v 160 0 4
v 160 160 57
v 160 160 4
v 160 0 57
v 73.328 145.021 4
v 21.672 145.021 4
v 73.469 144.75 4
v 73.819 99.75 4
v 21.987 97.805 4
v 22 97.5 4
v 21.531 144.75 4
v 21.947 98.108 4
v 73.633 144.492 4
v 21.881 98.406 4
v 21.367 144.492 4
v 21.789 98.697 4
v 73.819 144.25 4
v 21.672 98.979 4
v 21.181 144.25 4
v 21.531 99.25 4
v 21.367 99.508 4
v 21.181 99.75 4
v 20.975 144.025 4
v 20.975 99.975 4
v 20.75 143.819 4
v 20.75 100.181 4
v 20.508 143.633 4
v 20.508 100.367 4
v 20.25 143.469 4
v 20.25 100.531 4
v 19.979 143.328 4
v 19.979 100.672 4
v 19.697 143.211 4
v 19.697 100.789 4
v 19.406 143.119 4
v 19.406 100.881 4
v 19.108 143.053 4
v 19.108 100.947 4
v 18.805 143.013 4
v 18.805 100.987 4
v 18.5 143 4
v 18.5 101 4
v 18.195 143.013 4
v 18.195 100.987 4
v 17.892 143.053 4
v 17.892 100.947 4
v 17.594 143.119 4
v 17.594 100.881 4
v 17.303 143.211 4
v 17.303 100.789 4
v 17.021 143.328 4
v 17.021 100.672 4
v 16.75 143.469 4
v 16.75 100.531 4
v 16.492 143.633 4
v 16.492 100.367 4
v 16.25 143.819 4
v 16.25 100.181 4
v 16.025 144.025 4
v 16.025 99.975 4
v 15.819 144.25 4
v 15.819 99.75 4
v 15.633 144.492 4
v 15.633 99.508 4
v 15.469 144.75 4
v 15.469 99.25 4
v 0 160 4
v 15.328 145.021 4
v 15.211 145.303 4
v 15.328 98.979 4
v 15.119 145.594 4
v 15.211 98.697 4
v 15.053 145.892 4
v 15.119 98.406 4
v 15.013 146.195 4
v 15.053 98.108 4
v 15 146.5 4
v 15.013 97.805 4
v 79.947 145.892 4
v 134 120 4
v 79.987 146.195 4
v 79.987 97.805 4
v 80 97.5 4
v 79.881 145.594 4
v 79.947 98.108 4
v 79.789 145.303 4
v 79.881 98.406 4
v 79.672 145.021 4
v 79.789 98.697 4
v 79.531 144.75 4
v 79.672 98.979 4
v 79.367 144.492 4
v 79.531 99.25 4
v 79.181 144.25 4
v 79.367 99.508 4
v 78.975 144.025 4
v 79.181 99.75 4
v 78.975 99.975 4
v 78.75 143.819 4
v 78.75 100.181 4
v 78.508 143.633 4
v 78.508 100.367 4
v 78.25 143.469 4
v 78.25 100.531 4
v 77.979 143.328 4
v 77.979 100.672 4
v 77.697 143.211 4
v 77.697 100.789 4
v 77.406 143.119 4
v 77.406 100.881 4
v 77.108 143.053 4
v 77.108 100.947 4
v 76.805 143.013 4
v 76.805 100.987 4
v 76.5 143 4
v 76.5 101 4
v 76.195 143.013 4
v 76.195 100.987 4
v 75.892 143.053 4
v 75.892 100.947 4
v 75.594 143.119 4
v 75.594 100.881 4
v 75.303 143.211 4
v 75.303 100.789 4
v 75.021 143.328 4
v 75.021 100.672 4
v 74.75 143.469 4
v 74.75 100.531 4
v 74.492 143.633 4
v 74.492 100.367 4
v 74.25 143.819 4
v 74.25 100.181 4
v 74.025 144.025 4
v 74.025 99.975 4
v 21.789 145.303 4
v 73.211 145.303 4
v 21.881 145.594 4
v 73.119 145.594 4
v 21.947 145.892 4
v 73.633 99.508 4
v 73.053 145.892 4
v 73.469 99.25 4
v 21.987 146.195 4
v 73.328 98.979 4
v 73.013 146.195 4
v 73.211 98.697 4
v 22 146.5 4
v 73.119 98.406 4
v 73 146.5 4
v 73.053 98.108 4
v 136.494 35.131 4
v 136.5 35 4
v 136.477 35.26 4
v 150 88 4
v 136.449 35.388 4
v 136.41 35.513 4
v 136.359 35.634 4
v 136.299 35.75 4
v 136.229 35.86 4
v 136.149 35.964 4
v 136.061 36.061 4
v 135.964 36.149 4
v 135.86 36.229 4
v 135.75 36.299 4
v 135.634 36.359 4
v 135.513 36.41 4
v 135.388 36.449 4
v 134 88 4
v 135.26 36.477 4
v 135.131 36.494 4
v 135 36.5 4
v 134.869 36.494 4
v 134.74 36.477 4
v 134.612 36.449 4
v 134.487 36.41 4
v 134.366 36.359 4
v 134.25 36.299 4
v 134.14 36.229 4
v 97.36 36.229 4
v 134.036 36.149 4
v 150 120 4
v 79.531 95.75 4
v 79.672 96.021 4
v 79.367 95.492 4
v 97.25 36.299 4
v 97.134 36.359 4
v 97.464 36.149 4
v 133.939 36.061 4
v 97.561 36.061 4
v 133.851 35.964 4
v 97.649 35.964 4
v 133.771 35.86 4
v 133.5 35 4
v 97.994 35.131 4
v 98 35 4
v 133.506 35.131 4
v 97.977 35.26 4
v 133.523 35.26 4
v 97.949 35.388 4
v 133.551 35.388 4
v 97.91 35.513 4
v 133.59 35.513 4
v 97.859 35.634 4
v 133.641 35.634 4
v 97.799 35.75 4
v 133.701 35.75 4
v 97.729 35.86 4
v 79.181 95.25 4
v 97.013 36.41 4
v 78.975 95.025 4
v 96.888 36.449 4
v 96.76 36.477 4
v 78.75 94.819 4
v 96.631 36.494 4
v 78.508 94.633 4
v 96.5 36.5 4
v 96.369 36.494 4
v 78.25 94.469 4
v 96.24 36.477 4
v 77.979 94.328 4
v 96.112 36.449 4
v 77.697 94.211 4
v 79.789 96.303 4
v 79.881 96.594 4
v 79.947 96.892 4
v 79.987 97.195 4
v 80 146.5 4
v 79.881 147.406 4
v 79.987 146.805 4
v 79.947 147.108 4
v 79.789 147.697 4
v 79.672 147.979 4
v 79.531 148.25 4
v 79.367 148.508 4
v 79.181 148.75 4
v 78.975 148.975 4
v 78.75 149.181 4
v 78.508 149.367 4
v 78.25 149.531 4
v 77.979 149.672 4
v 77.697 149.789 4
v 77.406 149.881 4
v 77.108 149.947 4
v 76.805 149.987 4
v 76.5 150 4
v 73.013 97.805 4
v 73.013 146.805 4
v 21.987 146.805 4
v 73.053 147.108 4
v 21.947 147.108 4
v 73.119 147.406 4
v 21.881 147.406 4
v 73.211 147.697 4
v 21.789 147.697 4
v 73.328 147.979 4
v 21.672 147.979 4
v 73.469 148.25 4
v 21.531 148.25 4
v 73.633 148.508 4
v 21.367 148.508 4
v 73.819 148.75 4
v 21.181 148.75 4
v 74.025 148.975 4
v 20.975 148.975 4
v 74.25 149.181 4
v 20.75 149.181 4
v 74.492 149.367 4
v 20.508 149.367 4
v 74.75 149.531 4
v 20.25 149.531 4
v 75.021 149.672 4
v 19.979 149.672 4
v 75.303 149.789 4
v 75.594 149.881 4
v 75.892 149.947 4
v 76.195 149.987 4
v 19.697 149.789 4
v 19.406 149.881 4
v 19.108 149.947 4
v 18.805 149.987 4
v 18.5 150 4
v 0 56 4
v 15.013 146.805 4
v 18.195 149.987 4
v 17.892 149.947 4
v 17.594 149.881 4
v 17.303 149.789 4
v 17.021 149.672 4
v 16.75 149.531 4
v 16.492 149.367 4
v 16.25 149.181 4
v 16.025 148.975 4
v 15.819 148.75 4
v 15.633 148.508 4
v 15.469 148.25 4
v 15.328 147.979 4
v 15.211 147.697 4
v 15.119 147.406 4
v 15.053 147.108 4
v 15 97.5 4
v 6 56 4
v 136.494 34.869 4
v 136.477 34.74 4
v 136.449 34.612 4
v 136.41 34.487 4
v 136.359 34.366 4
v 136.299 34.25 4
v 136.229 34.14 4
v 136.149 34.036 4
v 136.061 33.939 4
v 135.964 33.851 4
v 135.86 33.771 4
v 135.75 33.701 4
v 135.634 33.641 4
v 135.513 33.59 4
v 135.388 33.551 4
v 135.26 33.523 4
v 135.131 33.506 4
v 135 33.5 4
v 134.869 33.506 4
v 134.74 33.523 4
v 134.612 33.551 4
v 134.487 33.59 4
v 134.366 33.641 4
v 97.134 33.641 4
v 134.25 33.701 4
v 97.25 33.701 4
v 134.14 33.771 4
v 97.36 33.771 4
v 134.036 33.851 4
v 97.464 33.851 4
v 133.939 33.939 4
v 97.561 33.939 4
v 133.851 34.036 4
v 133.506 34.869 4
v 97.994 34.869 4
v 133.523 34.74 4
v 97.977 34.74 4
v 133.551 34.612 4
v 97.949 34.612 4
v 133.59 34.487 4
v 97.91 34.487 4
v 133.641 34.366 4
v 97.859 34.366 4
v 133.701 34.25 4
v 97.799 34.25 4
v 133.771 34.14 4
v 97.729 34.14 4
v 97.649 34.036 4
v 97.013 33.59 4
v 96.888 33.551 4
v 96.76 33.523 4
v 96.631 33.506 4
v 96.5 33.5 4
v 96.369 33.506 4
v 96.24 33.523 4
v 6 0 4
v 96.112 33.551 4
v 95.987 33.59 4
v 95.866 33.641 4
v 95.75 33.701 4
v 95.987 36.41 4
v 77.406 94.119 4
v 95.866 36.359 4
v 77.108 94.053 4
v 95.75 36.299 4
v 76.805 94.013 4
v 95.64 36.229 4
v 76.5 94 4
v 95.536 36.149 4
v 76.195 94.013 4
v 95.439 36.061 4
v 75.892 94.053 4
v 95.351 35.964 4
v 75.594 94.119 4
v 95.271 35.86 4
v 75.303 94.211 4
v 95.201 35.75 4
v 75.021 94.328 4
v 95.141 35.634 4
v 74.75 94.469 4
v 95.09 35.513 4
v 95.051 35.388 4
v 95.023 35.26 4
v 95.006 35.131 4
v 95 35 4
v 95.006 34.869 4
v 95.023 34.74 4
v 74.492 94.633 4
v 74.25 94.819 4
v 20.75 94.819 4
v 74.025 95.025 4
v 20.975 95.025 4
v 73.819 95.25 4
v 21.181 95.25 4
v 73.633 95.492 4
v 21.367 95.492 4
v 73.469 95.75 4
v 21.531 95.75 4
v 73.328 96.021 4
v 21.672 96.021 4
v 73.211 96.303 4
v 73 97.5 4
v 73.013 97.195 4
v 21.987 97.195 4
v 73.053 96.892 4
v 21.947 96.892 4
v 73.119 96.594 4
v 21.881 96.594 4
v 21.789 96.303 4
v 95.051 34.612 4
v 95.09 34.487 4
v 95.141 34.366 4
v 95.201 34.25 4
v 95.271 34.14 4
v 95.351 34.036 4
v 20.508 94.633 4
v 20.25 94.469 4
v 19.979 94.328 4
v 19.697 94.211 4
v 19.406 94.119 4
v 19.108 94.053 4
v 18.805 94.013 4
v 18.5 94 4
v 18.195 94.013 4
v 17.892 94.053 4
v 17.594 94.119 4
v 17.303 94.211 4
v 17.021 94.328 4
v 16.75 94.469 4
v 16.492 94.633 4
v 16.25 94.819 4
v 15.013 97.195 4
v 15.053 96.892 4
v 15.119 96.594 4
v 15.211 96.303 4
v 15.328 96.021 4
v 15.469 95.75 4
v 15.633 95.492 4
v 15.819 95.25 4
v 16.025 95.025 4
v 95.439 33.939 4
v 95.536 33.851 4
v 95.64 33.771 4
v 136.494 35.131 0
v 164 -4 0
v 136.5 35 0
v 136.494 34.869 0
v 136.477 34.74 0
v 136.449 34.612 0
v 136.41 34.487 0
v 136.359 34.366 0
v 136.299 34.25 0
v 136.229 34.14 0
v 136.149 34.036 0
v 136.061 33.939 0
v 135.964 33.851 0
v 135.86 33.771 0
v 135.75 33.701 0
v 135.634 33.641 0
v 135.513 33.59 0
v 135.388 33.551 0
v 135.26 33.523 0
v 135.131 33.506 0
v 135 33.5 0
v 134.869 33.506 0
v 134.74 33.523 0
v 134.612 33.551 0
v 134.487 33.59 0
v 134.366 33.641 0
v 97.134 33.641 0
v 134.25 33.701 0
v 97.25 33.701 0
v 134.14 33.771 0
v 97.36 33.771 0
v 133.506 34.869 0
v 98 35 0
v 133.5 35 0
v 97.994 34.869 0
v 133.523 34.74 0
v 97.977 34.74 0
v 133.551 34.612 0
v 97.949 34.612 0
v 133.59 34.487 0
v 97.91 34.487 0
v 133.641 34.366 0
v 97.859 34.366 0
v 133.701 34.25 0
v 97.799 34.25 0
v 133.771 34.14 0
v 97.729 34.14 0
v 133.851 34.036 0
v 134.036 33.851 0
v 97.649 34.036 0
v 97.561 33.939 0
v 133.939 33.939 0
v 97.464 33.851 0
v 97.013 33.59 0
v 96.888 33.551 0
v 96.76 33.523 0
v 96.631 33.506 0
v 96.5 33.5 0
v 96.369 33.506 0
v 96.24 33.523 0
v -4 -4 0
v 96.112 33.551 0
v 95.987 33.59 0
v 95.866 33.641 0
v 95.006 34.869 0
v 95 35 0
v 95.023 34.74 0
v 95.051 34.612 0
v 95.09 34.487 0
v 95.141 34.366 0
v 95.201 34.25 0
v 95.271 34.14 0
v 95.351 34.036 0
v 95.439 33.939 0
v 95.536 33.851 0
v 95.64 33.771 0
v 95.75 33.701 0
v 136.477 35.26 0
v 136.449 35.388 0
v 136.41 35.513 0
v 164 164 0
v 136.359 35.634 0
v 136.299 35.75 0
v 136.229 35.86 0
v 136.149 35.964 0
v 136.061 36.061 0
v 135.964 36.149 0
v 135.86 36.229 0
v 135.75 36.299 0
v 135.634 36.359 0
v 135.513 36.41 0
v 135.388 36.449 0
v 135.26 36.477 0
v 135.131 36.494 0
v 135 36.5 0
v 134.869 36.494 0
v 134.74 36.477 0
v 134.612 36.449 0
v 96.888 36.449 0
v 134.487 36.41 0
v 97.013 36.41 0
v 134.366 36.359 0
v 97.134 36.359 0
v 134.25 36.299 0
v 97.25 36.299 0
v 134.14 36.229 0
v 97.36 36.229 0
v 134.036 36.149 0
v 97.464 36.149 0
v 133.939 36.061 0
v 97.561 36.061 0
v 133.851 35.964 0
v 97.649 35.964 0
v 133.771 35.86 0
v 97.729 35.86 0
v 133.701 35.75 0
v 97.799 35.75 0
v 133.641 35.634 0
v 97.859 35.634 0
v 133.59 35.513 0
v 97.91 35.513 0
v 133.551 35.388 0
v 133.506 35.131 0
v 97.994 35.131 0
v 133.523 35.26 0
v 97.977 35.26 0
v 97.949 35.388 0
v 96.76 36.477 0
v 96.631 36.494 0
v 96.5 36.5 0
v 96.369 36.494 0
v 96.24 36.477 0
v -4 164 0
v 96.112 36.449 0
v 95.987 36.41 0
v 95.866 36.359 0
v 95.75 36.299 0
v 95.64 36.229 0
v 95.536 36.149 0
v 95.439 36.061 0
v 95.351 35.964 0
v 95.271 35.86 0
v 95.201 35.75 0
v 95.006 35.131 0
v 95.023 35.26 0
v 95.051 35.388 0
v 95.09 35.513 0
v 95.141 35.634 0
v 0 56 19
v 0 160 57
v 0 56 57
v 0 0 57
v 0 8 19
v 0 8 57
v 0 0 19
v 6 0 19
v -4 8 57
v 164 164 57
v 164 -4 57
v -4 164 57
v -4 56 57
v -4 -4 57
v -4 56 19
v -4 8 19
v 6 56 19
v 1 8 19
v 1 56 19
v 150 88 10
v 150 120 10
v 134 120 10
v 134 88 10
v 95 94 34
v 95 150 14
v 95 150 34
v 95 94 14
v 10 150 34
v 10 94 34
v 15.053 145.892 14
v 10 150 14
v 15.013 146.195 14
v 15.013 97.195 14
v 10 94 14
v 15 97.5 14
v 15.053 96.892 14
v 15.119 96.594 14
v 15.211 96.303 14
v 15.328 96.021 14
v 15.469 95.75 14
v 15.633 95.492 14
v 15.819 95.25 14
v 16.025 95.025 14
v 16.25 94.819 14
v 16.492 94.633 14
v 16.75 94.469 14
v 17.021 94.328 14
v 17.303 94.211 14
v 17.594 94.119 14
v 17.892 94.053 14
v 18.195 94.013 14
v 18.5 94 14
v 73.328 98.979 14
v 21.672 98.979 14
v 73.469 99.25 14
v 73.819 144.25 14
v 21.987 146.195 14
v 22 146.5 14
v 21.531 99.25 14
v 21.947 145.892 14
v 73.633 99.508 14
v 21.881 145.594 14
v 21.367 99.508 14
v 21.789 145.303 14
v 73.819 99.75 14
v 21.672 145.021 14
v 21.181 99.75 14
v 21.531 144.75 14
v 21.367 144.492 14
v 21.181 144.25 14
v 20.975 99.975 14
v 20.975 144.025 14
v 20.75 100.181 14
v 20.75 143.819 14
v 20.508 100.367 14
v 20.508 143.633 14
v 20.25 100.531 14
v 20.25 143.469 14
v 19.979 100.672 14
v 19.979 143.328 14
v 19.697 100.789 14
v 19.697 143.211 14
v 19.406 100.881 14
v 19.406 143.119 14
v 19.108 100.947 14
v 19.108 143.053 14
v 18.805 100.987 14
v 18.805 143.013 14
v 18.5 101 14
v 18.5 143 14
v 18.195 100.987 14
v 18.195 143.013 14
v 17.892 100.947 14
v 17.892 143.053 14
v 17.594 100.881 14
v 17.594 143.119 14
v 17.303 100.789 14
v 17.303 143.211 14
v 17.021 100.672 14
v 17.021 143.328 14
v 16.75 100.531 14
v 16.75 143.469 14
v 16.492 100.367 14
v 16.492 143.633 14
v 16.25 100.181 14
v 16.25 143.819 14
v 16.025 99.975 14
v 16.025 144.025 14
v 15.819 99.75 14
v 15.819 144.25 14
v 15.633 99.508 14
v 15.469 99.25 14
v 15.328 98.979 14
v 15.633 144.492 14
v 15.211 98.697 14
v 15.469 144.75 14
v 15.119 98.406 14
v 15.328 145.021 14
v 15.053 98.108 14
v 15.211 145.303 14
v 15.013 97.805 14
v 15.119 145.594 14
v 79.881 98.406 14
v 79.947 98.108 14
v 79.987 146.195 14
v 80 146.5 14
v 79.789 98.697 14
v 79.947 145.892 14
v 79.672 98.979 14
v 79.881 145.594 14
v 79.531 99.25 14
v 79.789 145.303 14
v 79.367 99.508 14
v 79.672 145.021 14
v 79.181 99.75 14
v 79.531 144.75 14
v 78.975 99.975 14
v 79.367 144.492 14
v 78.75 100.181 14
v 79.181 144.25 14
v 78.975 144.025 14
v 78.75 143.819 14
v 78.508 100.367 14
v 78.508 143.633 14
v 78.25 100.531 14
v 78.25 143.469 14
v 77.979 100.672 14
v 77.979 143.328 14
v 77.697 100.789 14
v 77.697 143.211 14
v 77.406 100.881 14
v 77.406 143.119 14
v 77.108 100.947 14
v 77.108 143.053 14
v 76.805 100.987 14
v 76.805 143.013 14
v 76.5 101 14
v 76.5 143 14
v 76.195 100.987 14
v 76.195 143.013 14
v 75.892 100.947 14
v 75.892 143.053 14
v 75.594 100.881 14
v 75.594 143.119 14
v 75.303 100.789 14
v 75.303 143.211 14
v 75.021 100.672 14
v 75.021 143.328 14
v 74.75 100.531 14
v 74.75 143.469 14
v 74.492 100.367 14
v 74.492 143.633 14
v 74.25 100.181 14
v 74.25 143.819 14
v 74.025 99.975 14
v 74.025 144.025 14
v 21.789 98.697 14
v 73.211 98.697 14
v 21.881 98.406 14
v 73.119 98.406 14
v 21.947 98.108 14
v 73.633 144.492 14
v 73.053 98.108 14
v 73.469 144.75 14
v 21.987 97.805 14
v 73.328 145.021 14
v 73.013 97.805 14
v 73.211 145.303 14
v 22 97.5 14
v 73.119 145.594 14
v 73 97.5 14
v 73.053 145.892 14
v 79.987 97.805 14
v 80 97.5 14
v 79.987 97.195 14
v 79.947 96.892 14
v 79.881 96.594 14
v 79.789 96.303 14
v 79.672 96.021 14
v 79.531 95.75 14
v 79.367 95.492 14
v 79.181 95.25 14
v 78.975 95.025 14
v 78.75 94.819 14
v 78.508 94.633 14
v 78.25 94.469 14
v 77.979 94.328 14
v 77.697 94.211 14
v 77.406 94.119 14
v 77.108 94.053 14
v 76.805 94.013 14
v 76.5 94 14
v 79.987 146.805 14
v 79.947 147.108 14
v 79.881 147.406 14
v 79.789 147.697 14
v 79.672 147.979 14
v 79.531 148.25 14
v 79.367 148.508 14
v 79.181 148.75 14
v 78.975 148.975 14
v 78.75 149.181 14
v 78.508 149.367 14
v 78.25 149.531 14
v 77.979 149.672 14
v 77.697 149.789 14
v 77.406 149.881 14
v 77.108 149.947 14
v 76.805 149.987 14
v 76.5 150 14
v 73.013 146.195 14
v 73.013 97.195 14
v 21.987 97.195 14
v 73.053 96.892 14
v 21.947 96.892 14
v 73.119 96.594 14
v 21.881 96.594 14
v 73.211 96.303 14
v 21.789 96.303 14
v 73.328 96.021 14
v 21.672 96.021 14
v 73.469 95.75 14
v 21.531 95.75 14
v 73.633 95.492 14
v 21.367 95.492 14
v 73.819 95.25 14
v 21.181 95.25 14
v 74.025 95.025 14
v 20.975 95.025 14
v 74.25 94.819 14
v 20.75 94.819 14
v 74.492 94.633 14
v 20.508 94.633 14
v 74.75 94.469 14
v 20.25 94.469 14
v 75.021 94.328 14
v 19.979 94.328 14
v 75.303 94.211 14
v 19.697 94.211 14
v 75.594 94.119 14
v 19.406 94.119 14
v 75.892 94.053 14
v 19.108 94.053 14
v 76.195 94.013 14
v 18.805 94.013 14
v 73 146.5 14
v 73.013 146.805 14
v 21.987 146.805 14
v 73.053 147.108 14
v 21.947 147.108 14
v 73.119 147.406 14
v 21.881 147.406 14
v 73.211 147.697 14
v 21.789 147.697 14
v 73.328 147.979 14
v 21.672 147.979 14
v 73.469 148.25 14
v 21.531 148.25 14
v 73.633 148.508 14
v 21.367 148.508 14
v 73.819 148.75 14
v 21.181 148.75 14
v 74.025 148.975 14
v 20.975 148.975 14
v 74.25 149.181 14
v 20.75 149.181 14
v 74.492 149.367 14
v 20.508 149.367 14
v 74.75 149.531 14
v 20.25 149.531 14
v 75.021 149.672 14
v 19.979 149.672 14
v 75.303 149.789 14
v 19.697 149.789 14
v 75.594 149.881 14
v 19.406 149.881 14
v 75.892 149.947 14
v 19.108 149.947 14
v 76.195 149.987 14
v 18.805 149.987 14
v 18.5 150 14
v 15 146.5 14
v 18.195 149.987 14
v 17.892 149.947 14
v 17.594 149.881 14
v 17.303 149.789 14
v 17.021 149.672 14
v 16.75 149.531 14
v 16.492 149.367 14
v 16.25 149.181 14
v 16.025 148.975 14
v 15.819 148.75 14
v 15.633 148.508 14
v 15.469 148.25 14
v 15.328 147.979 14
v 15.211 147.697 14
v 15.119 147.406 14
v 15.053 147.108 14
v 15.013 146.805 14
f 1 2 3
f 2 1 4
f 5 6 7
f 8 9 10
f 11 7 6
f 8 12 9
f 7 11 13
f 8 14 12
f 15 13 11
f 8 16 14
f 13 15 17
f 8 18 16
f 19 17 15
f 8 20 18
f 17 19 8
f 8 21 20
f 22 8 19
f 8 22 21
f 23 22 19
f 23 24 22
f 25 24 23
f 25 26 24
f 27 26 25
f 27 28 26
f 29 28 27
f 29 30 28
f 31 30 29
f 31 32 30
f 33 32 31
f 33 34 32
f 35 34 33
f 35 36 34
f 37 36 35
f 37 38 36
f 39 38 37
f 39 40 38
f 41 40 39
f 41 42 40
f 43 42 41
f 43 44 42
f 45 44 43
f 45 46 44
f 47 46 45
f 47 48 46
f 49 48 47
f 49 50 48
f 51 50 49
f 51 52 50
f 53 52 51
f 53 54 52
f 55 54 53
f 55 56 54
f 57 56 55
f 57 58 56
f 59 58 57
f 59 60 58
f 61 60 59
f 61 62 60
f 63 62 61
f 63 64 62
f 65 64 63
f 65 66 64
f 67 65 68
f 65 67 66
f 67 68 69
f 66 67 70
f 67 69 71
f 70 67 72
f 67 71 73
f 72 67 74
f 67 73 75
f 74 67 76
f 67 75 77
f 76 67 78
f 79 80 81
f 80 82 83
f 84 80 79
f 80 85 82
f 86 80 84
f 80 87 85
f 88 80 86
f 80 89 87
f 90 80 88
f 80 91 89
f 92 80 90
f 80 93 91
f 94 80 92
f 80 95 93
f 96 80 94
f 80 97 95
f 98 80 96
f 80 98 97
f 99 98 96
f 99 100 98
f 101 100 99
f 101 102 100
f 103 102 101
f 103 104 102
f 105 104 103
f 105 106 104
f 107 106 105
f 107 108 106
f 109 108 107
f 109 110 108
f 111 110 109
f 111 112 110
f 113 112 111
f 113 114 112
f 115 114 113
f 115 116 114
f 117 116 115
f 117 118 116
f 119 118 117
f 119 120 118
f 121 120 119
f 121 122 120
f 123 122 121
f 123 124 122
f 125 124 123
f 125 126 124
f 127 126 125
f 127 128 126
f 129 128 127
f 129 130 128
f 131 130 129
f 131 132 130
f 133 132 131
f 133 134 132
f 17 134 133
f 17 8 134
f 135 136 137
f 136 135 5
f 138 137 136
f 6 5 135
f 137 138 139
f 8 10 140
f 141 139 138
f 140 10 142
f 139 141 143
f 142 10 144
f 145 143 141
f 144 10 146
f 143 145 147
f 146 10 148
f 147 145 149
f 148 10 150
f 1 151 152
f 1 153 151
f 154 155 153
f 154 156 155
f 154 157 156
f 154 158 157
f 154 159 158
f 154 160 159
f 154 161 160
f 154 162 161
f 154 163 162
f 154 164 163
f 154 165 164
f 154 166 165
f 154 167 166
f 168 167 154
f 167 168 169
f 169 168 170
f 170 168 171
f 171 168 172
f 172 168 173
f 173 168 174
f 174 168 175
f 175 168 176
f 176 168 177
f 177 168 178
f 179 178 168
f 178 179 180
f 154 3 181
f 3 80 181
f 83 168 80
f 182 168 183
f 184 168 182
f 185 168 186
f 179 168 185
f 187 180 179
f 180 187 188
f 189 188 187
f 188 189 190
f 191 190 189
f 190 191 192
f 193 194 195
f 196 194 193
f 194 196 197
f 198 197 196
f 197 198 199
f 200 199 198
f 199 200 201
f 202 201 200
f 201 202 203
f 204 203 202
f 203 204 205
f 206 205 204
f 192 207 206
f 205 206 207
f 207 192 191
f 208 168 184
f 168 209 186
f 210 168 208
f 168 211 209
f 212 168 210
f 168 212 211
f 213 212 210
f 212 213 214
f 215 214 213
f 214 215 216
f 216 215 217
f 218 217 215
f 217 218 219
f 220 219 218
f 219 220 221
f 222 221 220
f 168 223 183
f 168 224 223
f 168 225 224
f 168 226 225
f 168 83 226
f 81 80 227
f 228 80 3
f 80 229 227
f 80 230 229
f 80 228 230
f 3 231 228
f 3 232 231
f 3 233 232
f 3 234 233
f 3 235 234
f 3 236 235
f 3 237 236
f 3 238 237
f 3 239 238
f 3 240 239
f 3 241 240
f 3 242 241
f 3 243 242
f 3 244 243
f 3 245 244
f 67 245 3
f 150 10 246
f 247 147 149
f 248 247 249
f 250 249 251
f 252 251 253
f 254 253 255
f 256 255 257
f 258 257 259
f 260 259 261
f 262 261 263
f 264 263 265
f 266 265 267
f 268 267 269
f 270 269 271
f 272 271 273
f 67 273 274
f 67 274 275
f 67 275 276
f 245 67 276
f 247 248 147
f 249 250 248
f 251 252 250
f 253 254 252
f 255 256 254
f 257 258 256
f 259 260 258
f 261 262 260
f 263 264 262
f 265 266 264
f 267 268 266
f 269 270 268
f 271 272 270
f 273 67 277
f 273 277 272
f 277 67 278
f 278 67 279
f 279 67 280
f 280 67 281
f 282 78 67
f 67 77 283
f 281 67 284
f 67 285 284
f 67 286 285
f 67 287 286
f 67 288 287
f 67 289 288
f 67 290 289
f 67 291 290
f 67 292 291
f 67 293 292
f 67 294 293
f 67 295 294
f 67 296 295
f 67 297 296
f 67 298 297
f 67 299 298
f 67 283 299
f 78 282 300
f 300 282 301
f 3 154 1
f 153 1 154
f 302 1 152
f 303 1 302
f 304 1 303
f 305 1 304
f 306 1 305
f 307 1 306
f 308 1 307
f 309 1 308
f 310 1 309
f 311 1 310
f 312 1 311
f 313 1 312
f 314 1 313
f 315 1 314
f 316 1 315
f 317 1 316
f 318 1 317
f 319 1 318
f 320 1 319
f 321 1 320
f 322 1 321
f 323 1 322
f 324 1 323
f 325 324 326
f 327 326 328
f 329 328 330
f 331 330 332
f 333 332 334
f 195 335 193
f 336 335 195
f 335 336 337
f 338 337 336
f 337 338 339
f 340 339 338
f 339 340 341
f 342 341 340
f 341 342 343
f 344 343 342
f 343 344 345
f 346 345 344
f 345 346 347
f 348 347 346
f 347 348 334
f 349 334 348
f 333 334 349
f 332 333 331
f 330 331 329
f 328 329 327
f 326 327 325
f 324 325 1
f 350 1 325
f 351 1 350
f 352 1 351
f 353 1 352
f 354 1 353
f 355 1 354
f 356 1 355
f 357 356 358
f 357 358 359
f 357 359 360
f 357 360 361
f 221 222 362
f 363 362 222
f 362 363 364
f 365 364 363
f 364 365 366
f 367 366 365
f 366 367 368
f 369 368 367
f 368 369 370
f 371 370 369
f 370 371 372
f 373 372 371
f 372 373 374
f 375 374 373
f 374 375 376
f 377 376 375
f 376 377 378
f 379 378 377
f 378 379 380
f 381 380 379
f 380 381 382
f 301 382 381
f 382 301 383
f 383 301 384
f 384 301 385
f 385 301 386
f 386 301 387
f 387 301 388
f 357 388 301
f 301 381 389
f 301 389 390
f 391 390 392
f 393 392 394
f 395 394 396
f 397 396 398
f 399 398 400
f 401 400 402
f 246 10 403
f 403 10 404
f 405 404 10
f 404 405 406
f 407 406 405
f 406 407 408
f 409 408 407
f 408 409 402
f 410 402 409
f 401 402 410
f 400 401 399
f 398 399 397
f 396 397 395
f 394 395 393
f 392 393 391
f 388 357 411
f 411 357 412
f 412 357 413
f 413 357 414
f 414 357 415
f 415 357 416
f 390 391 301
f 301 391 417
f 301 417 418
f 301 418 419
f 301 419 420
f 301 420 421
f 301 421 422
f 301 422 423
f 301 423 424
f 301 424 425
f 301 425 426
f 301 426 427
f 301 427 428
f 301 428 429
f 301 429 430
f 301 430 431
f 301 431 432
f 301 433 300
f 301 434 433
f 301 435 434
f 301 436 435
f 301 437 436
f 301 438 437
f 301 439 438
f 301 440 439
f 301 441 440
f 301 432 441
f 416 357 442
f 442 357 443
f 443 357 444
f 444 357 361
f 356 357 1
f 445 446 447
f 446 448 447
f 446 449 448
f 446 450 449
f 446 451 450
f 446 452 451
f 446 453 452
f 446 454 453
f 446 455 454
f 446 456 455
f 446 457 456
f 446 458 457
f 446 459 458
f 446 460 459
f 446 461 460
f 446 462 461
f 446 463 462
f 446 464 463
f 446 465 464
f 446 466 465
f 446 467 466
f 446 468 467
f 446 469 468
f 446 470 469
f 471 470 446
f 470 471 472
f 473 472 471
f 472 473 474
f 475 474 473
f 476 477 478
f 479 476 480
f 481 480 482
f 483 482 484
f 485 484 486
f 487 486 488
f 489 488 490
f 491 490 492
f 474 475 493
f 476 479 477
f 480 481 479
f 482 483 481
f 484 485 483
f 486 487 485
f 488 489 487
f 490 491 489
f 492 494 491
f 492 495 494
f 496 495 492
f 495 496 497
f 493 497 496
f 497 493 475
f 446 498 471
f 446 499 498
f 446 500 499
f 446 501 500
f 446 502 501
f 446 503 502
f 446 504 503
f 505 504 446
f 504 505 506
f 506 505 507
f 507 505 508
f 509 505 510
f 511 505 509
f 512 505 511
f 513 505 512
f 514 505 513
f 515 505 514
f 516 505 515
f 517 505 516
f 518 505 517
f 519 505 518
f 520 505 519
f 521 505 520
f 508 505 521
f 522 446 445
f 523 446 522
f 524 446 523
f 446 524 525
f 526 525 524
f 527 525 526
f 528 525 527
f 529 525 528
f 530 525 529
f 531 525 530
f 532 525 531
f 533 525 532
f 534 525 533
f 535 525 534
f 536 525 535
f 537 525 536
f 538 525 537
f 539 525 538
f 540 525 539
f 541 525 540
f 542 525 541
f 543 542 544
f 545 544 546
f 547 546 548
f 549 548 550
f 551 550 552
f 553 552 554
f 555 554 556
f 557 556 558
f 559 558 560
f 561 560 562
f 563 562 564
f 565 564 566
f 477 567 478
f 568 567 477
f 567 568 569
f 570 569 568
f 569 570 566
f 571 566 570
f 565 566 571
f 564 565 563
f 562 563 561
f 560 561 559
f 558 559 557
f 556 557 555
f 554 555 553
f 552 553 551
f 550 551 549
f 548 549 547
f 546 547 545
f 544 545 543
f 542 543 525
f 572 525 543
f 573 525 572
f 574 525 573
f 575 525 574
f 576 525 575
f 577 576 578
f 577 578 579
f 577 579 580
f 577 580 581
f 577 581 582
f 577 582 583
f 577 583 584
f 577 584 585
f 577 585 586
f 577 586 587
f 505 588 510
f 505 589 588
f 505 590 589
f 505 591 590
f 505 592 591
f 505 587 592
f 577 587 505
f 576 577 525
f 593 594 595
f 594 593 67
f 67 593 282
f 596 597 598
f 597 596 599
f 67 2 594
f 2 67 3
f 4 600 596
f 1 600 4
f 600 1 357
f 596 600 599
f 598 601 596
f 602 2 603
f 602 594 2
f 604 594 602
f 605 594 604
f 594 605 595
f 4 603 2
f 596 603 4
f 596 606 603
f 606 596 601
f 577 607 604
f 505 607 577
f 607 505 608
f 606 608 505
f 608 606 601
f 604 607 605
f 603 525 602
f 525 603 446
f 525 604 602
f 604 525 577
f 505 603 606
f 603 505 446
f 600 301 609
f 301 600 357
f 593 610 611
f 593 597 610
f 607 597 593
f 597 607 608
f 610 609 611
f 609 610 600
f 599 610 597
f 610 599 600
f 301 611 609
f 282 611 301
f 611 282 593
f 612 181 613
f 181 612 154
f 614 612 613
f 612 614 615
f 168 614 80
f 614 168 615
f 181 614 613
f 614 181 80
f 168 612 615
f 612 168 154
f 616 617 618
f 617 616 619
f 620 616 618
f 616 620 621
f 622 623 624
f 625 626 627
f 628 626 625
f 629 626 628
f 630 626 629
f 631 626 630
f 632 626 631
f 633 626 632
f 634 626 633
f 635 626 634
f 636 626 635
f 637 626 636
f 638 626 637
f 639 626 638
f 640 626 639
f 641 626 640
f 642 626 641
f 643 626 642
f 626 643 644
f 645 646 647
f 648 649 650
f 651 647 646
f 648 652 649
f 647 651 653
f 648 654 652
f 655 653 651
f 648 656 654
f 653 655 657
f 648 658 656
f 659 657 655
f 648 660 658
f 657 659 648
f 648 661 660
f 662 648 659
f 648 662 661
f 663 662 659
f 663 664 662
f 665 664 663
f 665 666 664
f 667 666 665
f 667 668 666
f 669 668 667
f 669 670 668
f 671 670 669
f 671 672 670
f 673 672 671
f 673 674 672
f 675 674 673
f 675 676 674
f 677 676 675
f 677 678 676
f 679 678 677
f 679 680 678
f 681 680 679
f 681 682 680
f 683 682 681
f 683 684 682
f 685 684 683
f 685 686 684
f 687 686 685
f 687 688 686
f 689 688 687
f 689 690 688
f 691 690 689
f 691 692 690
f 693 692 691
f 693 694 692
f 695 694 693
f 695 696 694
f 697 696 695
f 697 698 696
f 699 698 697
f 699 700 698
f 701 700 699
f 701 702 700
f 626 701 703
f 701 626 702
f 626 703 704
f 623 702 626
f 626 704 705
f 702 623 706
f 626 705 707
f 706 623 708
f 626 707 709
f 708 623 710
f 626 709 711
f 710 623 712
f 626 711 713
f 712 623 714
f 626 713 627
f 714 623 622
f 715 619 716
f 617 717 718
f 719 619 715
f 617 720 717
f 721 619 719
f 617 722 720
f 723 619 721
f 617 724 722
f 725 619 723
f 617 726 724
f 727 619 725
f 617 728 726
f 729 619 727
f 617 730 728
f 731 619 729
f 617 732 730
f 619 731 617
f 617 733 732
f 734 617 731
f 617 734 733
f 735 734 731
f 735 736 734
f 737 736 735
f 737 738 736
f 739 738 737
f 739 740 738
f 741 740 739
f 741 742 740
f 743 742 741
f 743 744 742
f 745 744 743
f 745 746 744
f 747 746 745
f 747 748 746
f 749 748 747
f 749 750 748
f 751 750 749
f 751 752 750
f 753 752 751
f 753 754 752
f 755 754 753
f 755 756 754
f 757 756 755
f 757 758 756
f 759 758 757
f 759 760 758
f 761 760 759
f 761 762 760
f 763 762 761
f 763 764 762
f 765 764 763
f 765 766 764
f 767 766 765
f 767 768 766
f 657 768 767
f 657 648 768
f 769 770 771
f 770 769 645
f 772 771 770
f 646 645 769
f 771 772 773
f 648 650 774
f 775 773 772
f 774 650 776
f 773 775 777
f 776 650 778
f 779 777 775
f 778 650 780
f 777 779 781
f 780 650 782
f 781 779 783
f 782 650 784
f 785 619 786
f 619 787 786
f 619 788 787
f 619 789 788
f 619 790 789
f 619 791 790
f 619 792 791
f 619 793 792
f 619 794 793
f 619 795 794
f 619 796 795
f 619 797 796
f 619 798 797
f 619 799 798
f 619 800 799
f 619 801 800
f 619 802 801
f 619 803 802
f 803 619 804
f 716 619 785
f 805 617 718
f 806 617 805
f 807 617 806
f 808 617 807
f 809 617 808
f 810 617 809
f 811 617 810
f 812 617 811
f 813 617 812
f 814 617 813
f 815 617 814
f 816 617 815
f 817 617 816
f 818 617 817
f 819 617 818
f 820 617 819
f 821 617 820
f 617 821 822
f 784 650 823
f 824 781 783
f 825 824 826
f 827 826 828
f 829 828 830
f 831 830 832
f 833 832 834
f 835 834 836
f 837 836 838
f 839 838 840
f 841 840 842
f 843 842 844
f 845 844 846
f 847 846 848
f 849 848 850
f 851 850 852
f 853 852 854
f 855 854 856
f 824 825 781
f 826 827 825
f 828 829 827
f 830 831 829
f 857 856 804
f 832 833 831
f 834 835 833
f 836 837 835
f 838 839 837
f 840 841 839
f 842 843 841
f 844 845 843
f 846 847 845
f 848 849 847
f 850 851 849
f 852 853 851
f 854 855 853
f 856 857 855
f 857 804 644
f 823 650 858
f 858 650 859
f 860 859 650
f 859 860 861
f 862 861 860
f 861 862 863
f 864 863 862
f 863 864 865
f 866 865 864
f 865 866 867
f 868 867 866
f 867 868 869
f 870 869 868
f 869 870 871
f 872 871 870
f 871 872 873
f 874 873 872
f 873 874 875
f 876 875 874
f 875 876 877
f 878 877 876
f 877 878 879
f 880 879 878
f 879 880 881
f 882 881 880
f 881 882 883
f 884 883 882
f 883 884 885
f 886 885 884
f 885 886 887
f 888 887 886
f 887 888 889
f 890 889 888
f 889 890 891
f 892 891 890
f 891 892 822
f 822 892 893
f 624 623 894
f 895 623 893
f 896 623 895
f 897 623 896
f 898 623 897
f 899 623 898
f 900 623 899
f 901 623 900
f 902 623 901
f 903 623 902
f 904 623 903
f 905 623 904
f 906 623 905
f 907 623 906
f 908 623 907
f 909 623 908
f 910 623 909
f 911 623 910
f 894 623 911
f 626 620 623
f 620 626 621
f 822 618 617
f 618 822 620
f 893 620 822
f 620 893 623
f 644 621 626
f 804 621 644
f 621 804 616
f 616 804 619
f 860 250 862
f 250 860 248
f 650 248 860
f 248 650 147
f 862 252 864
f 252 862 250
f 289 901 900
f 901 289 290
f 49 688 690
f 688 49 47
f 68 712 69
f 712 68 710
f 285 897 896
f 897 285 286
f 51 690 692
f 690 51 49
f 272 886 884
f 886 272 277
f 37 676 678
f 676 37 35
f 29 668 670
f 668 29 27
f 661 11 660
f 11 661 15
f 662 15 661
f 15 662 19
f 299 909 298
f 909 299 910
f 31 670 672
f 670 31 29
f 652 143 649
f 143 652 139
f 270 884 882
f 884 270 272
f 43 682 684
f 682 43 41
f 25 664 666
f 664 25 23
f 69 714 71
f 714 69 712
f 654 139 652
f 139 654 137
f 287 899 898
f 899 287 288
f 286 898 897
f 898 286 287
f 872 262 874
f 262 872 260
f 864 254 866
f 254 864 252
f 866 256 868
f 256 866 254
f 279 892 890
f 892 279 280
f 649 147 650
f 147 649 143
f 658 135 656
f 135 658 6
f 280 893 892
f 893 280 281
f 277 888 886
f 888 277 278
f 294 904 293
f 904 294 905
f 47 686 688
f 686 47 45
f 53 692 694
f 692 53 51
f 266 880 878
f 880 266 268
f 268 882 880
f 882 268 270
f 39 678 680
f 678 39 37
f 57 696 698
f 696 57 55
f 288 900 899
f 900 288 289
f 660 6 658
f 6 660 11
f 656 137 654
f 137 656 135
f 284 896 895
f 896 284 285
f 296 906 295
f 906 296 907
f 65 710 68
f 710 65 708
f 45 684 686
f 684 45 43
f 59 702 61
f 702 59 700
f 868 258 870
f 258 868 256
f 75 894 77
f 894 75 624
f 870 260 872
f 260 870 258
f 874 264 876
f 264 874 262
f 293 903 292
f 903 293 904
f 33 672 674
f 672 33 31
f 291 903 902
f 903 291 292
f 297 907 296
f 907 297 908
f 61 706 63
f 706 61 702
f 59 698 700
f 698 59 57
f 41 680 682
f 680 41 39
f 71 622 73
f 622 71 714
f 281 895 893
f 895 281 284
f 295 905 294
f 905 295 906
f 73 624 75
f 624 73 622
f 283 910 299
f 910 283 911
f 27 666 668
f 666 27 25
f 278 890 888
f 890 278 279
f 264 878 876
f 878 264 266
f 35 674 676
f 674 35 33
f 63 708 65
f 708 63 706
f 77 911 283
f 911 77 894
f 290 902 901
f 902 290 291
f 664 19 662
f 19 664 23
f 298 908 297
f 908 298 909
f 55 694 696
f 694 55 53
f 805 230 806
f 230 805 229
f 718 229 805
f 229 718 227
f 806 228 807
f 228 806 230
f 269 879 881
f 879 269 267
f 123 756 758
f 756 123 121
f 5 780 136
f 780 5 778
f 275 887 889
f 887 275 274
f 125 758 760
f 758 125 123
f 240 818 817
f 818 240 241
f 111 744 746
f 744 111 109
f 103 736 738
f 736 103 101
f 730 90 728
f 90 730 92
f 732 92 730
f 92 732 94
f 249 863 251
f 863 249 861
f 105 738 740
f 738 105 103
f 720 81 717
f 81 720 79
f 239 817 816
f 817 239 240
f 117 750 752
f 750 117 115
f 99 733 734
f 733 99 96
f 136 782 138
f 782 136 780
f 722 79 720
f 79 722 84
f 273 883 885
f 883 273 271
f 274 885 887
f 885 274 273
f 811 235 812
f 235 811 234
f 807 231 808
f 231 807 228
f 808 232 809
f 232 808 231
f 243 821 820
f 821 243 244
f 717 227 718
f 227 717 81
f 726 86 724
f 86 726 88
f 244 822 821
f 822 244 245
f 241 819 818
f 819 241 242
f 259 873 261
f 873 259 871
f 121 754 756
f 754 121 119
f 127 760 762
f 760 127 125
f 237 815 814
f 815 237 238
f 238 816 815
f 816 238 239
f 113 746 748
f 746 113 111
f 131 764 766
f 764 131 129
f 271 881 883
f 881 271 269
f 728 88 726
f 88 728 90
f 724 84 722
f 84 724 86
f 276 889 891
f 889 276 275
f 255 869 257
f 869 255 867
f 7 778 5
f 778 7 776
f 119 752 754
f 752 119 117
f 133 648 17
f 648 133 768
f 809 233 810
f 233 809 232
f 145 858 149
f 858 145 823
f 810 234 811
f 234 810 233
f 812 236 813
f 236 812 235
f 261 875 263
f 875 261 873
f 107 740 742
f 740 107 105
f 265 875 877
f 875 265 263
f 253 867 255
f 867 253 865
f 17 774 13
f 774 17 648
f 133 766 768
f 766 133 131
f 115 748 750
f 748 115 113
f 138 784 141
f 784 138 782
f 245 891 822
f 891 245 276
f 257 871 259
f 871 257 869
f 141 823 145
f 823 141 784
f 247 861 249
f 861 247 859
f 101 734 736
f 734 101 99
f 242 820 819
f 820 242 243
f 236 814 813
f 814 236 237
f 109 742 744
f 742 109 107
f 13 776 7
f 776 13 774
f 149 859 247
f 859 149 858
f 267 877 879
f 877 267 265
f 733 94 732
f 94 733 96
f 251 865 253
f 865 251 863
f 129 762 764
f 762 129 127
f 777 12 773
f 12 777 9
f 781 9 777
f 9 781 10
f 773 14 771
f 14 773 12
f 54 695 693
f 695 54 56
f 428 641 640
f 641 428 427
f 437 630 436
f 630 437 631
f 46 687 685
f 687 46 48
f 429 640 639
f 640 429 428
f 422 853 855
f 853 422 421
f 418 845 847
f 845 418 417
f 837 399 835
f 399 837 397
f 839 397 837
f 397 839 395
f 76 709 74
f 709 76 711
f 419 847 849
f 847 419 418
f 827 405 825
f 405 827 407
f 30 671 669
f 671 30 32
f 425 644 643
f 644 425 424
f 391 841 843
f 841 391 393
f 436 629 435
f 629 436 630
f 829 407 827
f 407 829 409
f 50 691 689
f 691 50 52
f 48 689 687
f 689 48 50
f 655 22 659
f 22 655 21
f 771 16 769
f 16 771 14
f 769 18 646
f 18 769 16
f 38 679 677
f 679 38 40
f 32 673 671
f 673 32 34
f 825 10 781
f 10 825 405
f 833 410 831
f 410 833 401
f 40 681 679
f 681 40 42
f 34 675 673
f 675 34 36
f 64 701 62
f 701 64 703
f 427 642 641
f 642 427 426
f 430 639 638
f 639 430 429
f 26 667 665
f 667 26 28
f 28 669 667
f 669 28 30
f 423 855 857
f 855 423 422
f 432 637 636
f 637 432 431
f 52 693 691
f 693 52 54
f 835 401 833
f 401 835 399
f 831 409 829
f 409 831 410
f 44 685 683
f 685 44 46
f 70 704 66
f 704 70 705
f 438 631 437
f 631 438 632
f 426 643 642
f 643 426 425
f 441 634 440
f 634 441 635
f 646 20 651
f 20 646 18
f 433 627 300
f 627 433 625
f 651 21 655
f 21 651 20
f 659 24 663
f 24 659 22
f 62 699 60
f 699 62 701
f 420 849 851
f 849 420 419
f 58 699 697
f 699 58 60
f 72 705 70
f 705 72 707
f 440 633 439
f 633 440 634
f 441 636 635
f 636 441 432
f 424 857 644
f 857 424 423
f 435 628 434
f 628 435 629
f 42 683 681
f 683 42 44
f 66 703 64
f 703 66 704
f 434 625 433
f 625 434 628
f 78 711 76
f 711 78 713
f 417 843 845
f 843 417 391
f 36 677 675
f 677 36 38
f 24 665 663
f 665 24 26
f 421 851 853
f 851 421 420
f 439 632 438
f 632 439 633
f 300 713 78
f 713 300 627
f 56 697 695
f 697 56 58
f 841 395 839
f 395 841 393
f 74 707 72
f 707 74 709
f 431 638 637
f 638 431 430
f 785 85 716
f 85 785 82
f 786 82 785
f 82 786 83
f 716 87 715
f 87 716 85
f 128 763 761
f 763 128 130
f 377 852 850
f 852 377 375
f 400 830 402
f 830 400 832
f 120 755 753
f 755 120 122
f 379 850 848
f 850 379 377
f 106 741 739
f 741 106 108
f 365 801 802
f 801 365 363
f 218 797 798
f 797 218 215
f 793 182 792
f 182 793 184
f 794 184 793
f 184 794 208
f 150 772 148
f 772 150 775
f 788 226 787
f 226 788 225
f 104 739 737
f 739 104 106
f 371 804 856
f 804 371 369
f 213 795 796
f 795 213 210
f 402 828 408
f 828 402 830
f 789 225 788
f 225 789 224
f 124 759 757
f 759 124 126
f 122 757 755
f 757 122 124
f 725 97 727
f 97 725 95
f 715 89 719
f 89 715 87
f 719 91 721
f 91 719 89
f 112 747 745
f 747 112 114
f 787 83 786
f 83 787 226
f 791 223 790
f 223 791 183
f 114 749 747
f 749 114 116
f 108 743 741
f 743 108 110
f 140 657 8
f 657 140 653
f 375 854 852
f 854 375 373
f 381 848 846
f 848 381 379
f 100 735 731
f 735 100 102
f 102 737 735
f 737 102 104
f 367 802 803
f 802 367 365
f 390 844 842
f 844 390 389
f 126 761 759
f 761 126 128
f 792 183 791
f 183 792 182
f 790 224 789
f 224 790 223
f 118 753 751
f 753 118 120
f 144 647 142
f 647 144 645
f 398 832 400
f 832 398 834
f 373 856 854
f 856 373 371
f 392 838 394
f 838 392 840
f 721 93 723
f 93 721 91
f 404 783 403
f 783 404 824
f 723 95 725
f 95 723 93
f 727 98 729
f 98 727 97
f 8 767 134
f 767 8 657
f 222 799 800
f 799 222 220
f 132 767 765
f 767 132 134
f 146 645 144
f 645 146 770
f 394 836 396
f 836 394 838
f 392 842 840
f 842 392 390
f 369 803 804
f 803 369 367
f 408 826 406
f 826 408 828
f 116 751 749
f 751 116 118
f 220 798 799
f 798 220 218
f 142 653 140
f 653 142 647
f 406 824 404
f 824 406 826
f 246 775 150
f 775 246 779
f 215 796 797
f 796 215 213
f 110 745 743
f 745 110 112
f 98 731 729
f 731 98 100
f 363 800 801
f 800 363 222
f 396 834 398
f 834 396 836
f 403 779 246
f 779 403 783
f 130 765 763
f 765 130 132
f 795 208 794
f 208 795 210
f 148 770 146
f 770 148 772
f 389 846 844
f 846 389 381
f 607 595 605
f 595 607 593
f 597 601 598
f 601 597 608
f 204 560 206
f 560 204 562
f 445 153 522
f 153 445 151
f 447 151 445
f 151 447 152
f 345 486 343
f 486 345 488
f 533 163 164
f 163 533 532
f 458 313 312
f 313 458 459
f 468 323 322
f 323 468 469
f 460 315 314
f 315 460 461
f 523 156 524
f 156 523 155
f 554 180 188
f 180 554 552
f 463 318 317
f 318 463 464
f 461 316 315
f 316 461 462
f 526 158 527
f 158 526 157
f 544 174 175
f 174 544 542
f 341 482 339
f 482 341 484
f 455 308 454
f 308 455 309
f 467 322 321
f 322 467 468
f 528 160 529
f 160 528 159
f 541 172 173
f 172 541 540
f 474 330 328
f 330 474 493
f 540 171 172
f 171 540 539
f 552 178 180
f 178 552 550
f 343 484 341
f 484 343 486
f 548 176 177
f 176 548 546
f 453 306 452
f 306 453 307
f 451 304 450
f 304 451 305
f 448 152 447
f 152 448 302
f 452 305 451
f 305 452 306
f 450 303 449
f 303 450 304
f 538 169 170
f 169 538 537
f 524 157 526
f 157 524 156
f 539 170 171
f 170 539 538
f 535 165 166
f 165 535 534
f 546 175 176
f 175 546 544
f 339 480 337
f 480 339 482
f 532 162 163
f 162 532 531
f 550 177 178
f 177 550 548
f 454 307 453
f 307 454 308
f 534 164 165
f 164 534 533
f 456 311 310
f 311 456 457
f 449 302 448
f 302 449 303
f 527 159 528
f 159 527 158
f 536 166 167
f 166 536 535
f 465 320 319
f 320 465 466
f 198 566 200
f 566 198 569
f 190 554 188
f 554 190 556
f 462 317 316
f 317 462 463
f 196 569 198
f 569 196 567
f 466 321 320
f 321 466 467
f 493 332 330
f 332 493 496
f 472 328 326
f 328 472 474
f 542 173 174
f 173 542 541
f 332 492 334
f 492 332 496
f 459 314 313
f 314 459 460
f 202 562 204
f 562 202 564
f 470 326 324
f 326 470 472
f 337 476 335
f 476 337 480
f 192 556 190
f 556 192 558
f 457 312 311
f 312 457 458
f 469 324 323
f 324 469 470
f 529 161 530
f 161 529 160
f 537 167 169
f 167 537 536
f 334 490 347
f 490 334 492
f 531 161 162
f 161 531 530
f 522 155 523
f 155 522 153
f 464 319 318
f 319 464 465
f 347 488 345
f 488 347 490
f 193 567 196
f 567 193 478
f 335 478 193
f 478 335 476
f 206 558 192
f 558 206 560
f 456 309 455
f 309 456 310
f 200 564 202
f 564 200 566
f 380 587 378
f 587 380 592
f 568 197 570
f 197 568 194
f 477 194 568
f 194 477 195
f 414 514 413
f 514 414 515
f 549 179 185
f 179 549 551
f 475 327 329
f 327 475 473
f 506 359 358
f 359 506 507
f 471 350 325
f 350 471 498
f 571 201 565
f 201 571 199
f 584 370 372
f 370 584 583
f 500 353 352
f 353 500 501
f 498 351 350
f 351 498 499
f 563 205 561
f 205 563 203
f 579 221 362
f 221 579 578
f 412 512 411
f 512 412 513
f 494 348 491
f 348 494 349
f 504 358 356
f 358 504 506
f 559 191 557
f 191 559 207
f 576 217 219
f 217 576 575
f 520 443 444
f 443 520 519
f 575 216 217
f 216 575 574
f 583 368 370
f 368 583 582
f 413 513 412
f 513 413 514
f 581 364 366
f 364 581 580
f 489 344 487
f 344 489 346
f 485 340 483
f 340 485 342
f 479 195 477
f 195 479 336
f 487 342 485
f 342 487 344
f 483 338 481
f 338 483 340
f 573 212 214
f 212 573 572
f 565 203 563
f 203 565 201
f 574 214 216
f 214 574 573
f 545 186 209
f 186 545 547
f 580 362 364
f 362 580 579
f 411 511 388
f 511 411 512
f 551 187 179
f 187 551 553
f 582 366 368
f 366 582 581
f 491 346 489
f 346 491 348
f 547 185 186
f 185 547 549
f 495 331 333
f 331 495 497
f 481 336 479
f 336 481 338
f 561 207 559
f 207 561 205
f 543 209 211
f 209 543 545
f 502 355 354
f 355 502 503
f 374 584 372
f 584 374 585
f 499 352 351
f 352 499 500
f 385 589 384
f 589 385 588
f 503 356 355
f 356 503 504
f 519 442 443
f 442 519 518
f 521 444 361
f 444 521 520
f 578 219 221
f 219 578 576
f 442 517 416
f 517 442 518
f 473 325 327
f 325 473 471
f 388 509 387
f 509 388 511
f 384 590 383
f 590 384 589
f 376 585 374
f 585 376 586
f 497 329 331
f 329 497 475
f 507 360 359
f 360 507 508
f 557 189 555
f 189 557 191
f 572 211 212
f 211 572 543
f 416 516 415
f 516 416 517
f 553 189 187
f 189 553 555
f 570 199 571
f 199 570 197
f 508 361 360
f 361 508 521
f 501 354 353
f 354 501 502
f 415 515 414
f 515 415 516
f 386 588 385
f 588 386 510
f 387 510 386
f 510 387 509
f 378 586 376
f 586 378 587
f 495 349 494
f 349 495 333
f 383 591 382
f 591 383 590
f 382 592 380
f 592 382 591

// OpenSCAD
thickness = 4; // Wandstärke
width = 160; // x
length = 160; // y
height = 15*2+27;
$fn = 72;

difference()
{
    union()
    {
        // Grundplatte
        cube([width, length, thickness]);

        // Wand links (Kaltgerätestecker)
        translate([-thickness, 0, 0])
        cube([thickness, length, height]);

        // Wand rechts (Antenne)
        translate([width, 0, 0])
        cube([thickness, length, height]);

        // Wand oben
        translate([-thickness, length, 0])
        cube([width+2*thickness, thickness, height]);

        // Wand unten
        translate([-thickness, -thickness, 0])
        cube([width+2*thickness, thickness, height]);

        // Stütze für Kaltgerätestecker
        translate([0, 0, thickness])
        cube([6, 48+8, 15]);
        
        // Stütze für 433
        translate([width-10-16, length-10-62, thickness])
        cube([16, 32, 6]);
        
        // TODO remove dummy pi board
        translate([10, length-10-56, thickness+10])
        #cube([85, 56, 20]);
        
        // Stützen für Pi
        translate([15+3.5, length-10-3.5, thickness])
        #cylinder(d=7, h=10);
        
        translate([15+3.5+58, length-10-3.5, thickness])
        #cylinder(d=7, h=10);
        
        translate([15+3.5, length-10-3.5-49, thickness])
        #cylinder(d=7, h=10);
        
        translate([15+3.5+58, length-10-3.5-49, thickness])
        #cylinder(d=7, h=10);
    }

    // Aussparung für Kaltgerätestecker
    translate([-thickness-1, 8, thickness+15])
    cube([thickness+2, 48, 27]);
    // TODO dummy: 
    translate([-thickness-1, 8, thickness+15])
    cube([thickness+2, 48, height]);

    // Löcher für Netzteil
    translate([width-15-10, 25+10, -1])
    cylinder(d=3, h=thickness+2);

    translate([width-15-10-38.5, 25+10, -1])
    cylinder(d=3, h=thickness+2);
}
